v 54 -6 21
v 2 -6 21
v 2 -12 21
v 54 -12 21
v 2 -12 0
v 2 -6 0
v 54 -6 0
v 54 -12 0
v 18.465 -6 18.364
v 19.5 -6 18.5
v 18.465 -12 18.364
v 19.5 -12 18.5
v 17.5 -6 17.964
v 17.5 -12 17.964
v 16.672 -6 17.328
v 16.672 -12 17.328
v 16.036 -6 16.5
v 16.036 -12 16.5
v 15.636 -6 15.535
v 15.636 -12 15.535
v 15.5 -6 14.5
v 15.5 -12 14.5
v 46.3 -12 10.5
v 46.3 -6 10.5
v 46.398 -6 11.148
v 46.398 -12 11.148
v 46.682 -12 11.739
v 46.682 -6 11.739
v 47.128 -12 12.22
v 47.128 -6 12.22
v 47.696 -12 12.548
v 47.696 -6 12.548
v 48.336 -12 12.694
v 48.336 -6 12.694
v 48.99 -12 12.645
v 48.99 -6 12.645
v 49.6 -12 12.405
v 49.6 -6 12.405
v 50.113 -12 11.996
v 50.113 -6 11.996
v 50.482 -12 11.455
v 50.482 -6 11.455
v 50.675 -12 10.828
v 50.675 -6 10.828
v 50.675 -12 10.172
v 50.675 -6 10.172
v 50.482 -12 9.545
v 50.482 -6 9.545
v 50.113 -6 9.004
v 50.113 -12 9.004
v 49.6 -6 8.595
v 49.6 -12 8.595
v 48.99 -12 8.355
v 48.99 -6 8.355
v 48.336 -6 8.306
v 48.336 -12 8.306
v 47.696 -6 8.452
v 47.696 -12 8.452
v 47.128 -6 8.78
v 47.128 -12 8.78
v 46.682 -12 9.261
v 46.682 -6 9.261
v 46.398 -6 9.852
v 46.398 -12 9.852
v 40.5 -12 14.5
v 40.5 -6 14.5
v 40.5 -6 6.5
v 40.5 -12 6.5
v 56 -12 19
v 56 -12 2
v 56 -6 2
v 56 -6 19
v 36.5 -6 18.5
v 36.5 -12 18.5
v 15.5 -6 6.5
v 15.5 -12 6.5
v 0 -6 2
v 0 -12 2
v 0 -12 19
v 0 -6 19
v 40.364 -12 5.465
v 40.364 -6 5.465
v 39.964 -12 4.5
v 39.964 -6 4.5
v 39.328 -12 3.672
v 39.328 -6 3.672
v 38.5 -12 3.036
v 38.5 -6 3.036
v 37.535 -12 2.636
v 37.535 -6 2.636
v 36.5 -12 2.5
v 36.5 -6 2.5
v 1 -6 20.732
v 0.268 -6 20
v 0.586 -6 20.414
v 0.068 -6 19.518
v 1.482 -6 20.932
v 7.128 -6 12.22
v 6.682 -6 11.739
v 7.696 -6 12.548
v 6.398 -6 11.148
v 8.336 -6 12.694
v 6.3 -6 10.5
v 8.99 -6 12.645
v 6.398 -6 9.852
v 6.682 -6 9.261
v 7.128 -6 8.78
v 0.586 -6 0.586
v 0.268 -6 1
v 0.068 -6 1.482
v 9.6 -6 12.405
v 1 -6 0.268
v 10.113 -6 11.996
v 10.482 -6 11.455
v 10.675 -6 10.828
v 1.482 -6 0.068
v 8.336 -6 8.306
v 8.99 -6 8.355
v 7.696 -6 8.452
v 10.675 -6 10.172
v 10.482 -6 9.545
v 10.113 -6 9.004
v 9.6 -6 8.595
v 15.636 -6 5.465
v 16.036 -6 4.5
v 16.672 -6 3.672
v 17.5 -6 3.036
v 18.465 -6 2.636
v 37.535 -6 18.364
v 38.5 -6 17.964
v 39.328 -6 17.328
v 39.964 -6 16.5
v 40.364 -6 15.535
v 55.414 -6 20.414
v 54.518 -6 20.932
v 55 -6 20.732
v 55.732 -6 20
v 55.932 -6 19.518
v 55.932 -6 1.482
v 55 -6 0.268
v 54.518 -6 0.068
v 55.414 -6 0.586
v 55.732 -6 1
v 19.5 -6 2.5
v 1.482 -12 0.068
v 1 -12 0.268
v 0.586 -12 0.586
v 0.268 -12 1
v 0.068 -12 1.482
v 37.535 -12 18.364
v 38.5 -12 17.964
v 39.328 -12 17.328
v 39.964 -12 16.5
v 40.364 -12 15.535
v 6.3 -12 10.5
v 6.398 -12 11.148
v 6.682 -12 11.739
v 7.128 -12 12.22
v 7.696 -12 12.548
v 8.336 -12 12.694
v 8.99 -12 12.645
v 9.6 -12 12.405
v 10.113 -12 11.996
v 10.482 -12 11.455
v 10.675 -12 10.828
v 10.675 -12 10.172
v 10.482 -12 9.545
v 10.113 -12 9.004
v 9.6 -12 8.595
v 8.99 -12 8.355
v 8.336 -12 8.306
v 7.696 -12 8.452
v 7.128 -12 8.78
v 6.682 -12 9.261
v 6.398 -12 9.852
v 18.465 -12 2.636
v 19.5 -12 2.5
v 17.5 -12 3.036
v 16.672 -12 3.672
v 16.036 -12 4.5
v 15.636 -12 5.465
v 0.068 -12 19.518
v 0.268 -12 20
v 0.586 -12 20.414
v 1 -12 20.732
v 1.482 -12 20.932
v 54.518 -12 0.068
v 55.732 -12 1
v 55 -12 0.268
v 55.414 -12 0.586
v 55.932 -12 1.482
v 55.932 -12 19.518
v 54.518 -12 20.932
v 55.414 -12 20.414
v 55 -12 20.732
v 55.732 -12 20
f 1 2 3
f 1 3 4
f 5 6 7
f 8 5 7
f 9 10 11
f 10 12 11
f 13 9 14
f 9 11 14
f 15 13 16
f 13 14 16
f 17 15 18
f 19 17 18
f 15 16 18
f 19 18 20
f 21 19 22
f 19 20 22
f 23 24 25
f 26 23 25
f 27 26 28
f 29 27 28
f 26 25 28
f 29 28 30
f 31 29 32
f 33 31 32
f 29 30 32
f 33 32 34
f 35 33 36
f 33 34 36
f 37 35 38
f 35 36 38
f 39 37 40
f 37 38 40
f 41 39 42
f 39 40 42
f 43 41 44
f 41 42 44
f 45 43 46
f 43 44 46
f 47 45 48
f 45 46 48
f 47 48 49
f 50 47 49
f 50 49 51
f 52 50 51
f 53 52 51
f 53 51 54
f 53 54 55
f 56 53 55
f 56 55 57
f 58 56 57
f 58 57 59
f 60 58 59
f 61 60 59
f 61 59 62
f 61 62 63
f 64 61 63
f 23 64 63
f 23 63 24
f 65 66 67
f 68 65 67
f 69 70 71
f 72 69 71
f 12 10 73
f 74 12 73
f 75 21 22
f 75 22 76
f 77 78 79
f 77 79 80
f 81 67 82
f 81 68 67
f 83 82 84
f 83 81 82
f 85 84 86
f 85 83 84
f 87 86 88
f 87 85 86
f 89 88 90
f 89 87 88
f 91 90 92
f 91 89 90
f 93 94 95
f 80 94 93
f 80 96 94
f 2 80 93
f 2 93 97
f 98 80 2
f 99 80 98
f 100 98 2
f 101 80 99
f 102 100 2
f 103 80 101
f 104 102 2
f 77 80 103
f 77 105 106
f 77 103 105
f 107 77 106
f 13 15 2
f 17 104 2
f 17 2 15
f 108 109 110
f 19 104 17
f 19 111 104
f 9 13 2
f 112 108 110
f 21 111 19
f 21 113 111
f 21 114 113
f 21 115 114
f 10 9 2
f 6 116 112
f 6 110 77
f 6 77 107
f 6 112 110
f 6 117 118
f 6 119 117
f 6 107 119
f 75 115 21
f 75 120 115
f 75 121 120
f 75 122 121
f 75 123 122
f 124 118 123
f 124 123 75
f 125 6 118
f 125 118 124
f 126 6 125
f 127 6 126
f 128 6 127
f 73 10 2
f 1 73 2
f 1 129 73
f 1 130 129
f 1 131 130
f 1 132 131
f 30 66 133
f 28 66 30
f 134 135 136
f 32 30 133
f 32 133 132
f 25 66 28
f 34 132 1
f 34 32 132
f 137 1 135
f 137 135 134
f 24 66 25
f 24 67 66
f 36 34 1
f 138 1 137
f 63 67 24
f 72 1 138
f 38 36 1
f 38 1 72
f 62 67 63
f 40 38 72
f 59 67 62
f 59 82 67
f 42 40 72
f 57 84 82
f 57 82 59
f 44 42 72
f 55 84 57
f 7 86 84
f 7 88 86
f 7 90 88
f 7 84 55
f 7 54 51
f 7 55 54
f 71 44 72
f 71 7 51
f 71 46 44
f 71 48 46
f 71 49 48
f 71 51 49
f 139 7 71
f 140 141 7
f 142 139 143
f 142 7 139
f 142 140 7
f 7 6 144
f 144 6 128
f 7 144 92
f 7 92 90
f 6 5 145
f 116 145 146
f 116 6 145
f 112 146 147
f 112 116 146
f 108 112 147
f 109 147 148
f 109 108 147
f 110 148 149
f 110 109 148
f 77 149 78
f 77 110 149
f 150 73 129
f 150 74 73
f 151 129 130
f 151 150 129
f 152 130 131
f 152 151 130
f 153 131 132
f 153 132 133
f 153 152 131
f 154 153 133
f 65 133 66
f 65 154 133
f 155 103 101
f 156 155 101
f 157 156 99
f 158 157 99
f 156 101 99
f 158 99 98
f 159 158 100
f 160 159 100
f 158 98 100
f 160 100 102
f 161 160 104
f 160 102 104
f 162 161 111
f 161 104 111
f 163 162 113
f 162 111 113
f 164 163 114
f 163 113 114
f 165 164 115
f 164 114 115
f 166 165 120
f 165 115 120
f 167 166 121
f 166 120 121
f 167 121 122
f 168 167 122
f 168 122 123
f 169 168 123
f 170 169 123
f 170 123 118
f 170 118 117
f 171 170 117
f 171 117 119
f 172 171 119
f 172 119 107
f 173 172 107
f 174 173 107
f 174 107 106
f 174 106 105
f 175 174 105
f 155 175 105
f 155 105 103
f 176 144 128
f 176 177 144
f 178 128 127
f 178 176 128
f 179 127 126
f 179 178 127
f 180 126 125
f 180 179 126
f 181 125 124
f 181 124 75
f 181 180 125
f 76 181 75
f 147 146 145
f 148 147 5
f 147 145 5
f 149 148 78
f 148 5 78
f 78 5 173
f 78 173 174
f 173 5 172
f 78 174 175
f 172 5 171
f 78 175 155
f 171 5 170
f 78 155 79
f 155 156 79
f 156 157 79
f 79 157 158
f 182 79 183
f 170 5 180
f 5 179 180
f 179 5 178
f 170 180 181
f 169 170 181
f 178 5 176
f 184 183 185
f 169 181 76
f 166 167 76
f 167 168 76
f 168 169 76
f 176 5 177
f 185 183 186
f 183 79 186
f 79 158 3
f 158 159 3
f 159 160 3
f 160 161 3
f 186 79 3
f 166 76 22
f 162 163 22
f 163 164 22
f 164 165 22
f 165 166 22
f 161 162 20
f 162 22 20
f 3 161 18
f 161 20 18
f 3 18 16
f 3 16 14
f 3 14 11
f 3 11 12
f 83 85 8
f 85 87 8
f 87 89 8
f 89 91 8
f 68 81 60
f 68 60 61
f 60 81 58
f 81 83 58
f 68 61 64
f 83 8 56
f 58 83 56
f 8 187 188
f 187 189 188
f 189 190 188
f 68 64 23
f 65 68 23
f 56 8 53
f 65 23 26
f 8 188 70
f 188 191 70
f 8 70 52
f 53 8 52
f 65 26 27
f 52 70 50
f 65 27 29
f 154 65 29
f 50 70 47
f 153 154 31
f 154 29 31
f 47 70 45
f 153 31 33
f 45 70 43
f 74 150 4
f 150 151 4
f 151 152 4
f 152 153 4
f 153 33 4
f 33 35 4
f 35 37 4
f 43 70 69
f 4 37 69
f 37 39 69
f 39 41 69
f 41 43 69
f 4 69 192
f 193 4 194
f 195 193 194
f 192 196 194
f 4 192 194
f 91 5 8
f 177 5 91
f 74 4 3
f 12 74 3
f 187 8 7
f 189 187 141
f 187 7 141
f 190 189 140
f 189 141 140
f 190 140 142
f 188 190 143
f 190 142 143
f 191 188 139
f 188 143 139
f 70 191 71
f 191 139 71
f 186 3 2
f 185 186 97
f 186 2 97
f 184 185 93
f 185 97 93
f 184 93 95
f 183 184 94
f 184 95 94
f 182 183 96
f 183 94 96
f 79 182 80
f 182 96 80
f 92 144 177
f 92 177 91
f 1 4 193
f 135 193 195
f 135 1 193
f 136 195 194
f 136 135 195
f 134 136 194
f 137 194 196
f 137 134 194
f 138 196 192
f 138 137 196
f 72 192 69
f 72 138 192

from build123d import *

# Parameters (mm, degrees)
SKETCH_1_W          = 28
SKETCH_1_H          = 12
EXTRUDE_1_DEPTH     = 21
SKETCH_2_R          = 1.75
CUT_EXTRUDE_1_DEPTH = 59
SKETCH_3_R          = 2.2
CUT_EXTRUDE_2_DEPTH = 65
SKETCH_7_W          = 15
SKETCH_7_H          = 15
CUT_EXTRUDE_3_DEPTH = 109
CUT_EXTRUDE_5_DEPTH = 84
FILLET_1_R          = 2
CUT_EXTRUDE_6_DEPTH = 6
SKETCH_15_W         = 25
SKETCH_15_H         = 16
CUT_EXTRUDE_7_DEPTH = 55
FILLET_2_R          = 4


with BuildPart() as part:
    # 草图1 → 凸台-拉伸1 (new body)
    with BuildSketch(Plane.XY):
        Polygon((56, -12), (28, -12), (0, -12), (-13, -12), (-13, -63), (69, -63), (69, -12), align=None)
        with Locations((42, -6)):
            Rectangle(SKETCH_1_W, SKETCH_1_H)
        with Locations((14, -6)):
            Rectangle(SKETCH_1_W, SKETCH_1_H)
    extrude(amount=EXTRUDE_1_DEPTH)

    # 草图2 → 切除-拉伸1 (cut)
    with BuildSketch(Plane(origin=(0, 0, 0), x_dir=(-1, 0, 0), z_dir=(0, 0, -1))):
        with Locations((-58, -54.25)):
            Circle(SKETCH_2_R)
        with Locations((2, -54.25)):
            Circle(SKETCH_2_R)
    extrude(amount=-CUT_EXTRUDE_1_DEPTH, mode=Mode.SUBTRACT)

    # 草图3 → 切除-拉伸2 (cut)
    with BuildSketch(Plane(origin=(0, 0, 0), x_dir=(1, 0, 0), z_dir=(0, 1, 0))):
        with Locations(Location((48.5, -10.5, 0), (0, 0, 180))):
            Circle(SKETCH_3_R)
        with Locations(Location((8.5, -10.5, 0), (0, 0, 180))):
            Circle(SKETCH_3_R)
    extrude(amount=-CUT_EXTRUDE_2_DEPTH, mode=Mode.SUBTRACT)

    # 草图7 → 切除-拉伸3 (cut)
    with BuildSketch(Plane(origin=(69, 0, 0), x_dir=(0, 0, -1), z_dir=(1, 0, 0))):
        with Locations((-10.5, -19.5)):
            Rectangle(SKETCH_7_W, SKETCH_7_H)
    extrude(amount=-CUT_EXTRUDE_3_DEPTH, mode=Mode.SUBTRACT)

    # 草图9 → 切除-拉伸5 (cut, symmetric)
    with BuildSketch(Plane(origin=(56, 0, 0), x_dir=(0, 0, -1), z_dir=(1, 0, 0))):
        Polygon((-18, -27), (-18, -12), (-21, -12), (-21, -63), (0, -63), (0, -12), (-3, -12), (-3, -27), align=None)
    extrude(amount=CUT_EXTRUDE_5_DEPTH, both=True, mode=Mode.SUBTRACT)

    # 圆角1
    fillet_1_edges = [part.edges().sort_by_distance(p)[0] for p in [
        (0, -6, 0),
        (56, -6, 0),
        (56, -6, 21),
        (0, -6, 21),
    ]]
    fillet(fillet_1_edges, radius=FILLET_1_R)

    # 草图14 → 切除-拉伸6 (cut)
    with BuildSketch(Plane(origin=(0, 0, 0), x_dir=(1, 0, 0), z_dir=(0, 1, 0))):
        with BuildLine():
            Line((56, -19), (56, -2))
            ThreePointArc((56, -2), (55.414213562, -0.585786438), (54, 0))
            Line((54, 0), (2, 0))
            ThreePointArc((2, 0), (0.585786438, -0.585786438), (0, -2))
            Line((0, -2), (0, -19))
            ThreePointArc((0, -19), (0.585786438, -20.414213562), (2, -21))
            Line((2, -21), (54, -21))
            ThreePointArc((54, -21), (55.414213562, -20.414213562), (56, -19))
        make_face()
    extrude(amount=-CUT_EXTRUDE_6_DEPTH, mode=Mode.SUBTRACT)

    # 草图15 → 切除-拉伸7 (cut)
    with BuildSketch(Plane(origin=(0, -6, 0), x_dir=(1, 0, 0), z_dir=(0, 1, 0))):
        with Locations((28, -10.5)):
            Rectangle(SKETCH_15_W, SKETCH_15_H)
    extrude(amount=-CUT_EXTRUDE_7_DEPTH, mode=Mode.SUBTRACT)

    # 圆角2
    fillet_2_edges = [part.edges().sort_by_distance(p)[0] for p in [
        (40.5, -9, 2.5),
        (40.5, -9, 18.5),
        (15.5, -9, 18.5),
        (15.5, -9, 2.5),
    ]]
    fillet(fillet_2_edges, radius=FILLET_2_R)


solid = part.part
